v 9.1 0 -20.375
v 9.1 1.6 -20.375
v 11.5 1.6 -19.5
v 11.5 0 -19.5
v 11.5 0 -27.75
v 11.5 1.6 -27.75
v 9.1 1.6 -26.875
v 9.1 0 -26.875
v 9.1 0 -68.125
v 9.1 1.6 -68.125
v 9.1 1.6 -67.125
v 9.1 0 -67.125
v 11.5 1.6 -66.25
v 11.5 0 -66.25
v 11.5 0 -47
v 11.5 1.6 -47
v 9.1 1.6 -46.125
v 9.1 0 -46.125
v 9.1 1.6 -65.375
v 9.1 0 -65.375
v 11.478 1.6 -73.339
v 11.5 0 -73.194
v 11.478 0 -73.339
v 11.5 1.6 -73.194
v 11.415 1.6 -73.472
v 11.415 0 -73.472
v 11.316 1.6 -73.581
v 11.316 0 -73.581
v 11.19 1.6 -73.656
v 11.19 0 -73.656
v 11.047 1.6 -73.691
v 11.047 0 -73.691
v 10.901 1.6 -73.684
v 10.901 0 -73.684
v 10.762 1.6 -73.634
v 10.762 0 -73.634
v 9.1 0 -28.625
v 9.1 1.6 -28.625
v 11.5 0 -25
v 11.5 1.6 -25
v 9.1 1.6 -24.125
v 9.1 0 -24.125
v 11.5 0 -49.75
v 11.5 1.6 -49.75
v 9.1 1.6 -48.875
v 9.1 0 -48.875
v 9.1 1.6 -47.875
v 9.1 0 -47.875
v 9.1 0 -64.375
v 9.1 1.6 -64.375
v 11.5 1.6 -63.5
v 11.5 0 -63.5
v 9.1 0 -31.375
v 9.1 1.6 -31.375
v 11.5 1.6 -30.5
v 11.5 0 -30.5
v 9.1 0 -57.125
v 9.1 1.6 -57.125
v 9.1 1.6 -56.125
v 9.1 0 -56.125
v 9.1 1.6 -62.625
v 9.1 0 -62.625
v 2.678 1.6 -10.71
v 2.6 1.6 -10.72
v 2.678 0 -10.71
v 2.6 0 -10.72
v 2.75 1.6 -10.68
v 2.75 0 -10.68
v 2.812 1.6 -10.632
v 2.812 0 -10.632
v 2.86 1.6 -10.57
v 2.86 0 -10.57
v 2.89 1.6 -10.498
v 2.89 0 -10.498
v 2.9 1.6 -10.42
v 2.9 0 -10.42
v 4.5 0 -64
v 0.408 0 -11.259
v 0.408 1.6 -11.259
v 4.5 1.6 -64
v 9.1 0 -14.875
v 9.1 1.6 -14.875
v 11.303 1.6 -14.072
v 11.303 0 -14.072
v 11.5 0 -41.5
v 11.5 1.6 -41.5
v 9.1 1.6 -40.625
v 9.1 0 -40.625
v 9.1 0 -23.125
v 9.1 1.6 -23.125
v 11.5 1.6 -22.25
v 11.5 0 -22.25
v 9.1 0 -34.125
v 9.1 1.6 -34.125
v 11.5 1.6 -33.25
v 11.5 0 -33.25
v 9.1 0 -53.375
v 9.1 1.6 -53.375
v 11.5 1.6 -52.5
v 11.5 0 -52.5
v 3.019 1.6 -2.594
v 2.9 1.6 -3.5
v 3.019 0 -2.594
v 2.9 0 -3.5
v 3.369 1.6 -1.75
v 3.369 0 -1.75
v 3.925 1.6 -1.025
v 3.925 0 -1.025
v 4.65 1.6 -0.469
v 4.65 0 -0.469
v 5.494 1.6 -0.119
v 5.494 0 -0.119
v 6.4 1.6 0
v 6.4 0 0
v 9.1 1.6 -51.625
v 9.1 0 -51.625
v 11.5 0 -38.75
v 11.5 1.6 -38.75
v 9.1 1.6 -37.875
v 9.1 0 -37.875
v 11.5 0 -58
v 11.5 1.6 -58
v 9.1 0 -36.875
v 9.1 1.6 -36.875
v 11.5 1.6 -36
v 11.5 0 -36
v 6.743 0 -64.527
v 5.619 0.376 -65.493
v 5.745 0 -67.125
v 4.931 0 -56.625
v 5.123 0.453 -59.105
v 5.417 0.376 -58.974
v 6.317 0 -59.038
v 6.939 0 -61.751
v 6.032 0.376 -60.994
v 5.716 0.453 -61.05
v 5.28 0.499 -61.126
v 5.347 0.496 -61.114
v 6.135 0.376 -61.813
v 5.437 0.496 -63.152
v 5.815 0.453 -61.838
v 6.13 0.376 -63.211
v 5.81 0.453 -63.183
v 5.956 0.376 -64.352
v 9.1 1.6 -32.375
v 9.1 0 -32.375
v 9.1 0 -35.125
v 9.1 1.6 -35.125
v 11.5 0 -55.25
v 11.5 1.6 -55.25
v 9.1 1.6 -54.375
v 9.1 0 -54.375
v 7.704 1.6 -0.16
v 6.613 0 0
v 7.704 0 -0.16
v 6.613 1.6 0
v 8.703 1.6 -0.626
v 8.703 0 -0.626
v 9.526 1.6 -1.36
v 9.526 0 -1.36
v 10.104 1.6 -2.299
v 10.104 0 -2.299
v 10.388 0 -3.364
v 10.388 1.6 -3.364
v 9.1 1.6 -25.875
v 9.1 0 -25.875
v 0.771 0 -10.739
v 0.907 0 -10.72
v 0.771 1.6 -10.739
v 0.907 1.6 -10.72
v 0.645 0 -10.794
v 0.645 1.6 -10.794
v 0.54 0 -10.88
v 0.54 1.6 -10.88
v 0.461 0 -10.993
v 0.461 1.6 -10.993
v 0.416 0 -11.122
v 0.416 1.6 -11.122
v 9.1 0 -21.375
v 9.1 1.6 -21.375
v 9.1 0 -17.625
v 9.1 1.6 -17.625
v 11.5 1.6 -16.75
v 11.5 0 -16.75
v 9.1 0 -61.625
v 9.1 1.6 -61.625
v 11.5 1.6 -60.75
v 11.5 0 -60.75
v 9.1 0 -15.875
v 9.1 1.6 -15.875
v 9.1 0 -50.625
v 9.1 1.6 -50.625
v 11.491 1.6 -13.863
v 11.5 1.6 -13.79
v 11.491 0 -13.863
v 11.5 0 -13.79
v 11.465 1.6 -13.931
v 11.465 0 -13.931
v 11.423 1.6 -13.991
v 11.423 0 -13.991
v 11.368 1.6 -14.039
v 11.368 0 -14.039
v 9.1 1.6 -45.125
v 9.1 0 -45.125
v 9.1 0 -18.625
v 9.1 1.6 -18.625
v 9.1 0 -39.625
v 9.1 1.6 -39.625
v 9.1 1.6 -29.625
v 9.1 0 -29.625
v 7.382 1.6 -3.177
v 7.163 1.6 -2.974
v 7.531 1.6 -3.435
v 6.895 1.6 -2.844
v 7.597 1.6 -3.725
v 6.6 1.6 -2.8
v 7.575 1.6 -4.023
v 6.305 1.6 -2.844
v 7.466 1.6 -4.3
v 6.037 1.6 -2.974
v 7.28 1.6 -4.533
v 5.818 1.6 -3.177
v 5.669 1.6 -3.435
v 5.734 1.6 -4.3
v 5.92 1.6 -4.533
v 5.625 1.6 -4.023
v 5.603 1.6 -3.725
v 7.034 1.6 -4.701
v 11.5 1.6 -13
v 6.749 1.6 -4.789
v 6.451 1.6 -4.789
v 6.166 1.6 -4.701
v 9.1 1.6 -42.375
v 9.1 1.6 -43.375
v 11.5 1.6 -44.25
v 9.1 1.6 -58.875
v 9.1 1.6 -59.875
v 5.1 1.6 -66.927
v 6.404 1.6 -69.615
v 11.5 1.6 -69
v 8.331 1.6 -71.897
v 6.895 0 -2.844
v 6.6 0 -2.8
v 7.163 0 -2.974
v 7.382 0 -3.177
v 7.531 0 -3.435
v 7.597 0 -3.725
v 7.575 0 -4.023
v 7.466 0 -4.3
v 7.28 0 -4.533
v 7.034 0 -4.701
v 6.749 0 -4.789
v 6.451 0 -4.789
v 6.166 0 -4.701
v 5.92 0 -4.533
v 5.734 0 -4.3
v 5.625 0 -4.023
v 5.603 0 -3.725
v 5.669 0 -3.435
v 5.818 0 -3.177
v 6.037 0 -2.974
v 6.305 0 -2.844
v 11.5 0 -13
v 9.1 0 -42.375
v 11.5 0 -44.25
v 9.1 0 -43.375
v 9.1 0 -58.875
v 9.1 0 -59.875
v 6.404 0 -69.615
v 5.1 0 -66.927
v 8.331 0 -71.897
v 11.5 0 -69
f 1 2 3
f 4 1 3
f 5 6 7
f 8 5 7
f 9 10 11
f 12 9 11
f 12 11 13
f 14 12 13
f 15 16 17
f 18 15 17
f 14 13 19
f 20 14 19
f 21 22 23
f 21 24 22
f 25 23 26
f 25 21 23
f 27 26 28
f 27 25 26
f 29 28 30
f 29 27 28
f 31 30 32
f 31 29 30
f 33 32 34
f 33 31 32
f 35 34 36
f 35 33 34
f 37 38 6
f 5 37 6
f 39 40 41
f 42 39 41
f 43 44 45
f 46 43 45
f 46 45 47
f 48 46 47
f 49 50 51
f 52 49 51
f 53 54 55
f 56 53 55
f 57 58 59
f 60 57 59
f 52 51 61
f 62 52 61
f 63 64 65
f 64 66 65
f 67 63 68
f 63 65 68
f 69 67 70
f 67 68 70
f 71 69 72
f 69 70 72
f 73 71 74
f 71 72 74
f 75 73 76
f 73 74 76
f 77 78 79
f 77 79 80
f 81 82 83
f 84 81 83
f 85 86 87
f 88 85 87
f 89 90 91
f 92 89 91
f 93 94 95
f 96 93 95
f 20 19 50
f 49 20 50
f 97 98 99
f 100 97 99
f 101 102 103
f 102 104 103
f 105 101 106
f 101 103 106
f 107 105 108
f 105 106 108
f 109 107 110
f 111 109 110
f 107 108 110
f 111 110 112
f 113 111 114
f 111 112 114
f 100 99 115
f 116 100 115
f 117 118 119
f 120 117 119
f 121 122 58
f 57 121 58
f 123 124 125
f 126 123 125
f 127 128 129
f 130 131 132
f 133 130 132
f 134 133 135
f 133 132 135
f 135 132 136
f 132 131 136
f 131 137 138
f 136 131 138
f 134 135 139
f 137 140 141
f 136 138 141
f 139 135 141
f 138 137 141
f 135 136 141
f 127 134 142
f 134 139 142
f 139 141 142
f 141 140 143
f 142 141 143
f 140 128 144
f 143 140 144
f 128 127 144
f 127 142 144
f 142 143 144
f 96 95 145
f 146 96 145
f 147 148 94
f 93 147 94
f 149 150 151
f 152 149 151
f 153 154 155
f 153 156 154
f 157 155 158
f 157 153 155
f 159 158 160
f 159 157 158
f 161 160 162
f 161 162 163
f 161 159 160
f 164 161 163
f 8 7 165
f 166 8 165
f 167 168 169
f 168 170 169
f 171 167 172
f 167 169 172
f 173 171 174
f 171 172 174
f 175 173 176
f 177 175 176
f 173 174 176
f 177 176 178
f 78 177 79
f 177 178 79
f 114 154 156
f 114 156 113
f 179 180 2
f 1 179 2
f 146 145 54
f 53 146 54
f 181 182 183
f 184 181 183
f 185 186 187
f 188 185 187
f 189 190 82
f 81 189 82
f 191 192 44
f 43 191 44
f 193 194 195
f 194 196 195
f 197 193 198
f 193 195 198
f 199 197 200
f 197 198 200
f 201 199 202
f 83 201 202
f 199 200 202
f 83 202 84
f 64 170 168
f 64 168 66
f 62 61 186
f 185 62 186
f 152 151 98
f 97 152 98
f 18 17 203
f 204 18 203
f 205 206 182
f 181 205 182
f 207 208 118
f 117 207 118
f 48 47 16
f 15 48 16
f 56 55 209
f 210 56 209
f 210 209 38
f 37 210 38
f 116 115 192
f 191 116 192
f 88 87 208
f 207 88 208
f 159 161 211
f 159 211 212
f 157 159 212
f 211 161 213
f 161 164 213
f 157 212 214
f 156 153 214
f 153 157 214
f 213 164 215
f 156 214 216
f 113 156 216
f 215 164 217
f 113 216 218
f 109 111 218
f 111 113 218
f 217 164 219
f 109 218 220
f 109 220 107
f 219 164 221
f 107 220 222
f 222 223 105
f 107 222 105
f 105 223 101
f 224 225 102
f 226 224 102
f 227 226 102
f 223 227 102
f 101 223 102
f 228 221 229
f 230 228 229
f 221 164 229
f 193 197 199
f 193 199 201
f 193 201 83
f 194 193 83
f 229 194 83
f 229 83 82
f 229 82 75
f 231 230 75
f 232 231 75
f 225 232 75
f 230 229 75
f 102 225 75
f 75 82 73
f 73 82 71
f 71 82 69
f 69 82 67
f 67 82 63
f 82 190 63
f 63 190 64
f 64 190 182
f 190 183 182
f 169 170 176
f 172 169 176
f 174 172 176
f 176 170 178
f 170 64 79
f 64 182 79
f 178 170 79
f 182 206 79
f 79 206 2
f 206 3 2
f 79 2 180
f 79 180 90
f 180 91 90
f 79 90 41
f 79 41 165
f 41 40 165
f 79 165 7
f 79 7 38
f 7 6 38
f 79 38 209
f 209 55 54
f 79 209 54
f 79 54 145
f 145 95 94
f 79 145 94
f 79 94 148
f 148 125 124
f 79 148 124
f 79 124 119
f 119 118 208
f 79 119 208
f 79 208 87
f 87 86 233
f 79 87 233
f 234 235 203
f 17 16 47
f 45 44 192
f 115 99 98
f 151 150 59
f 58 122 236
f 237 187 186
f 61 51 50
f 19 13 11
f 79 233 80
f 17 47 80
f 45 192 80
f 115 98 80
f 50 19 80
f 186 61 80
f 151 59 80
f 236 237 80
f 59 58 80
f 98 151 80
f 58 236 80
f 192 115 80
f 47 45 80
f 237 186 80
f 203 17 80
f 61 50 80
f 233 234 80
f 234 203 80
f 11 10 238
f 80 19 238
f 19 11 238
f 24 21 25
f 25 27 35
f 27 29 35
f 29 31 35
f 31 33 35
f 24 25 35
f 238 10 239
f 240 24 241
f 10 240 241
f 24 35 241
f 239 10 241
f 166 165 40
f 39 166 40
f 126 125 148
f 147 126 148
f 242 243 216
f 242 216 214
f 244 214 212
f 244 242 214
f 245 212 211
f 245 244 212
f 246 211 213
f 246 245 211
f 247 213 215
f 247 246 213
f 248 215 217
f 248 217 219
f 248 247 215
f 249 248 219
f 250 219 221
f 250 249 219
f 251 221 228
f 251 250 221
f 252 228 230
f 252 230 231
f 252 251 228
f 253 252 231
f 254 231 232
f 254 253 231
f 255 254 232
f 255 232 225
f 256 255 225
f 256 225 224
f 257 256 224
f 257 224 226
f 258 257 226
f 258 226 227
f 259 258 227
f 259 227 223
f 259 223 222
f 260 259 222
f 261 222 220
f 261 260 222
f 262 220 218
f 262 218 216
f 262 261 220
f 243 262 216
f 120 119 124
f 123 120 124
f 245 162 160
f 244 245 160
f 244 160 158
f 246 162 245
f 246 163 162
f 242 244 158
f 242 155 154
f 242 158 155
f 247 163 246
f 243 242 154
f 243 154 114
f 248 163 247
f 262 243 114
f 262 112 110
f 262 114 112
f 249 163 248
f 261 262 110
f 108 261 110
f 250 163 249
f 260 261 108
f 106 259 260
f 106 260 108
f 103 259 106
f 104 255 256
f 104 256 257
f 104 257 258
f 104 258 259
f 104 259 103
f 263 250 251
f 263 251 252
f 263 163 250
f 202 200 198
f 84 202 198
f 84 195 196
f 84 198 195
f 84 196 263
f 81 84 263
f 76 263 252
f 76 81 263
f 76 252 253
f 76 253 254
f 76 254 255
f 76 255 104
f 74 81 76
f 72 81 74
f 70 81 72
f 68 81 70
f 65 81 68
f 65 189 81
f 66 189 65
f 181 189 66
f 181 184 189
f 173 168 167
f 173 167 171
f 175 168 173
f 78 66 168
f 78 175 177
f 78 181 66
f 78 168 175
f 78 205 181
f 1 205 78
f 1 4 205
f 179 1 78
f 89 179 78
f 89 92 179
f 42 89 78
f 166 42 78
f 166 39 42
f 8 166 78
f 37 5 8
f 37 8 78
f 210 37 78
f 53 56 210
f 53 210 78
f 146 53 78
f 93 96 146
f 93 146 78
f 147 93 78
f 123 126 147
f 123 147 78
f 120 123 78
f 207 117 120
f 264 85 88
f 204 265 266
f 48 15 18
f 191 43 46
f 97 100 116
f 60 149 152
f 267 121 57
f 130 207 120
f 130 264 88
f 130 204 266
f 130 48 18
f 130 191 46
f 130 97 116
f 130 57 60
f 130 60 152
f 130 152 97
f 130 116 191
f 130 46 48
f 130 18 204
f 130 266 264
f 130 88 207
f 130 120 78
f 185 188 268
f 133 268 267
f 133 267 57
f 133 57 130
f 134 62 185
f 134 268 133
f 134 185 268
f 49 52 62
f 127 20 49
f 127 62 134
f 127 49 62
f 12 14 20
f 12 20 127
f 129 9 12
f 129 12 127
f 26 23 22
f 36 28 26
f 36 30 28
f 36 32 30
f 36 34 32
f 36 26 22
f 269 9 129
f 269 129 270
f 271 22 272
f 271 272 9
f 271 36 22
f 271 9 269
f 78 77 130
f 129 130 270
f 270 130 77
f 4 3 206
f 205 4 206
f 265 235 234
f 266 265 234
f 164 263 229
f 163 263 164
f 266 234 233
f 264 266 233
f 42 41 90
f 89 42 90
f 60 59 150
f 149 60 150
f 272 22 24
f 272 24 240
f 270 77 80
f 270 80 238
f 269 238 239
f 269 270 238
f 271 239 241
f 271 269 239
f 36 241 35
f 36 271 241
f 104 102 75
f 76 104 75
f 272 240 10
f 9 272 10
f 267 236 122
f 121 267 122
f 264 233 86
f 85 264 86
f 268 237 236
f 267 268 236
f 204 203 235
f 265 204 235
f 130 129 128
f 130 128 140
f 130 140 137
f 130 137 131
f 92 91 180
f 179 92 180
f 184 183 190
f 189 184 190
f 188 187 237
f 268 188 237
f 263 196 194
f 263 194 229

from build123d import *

# Parameters (mm, degrees)
SKETCH2_R           = 1
BOSS_EXTRUDE1_DEPTH = 1.6
FILLET1_R           = 3.8
SKETCH3_W           = 2.9
SKETCH3_H           = 10.72
CUT_EXTRUDE1_DEPTH  = 75.905340264
CUT_EXTRUDE2_DEPTH  = 75.905340264
FILLET2_R           = 0.5
LPATTERN1_COUNT     = 20
LPATTERN1_PITCH     = 2.75
CUT_EXTRUDE5_DEPTH  = 0.5
FILLET3_R           = 3
FILLET4_R           = 3.5
FILLET5_R           = 0.5
FILLET6_R           = 0.3


with BuildPart() as part:
    # Sketch2 → Boss-Extrude1 (new body)
    with BuildSketch(Plane(origin=(0, 0, 0), x_dir=(1, 0, 0), z_dir=(0, 1, 0))):
        with BuildLine():
            Line((0, 0), (0, 6))
            Line((0, 6), (4.5, 64))
            ThreePointArc((4.5, 64), (6.634239414, 69.95603241), (11.5, 74))
            Line((11.5, 74), (11.5, 13))
            Line((11.5, 13), (10, 0))
            Line((10, 0), (0, 0))
        make_face()
        with Locations(Location((6.6, 3.8, 0), (0, 0, 270))):
            Circle(SKETCH2_R, mode=Mode.SUBTRACT)
    extrude(amount=BOSS_EXTRUDE1_DEPTH)

    # Fillet1
    fillet1_edges = [part.edges().sort_by_distance(p)[0] for p in [
        (10, 0.8, 0),
    ]]
    fillet(fillet1_edges, radius=FILLET1_R)

    # Sketch3 → Cut-Extrude1 (cut, through all)
    with BuildSketch(Plane(origin=(0, 1.6, 0), x_dir=(1, 0, 0), z_dir=(0, 1, 0))):
        with Locations((1.45, 5.36)):
            Rectangle(SKETCH3_W, SKETCH3_H)
    extrude(amount=-CUT_EXTRUDE1_DEPTH, mode=Mode.SUBTRACT)

    # Sketch4 → Cut-Extrude2 (cut, through all)
    with BuildSketch(Plane(origin=(0, 1.6, 0), x_dir=(1, 0, 0), z_dir=(0, 1, 0))):
        Polygon((11.5, 69), (9.1, 68.125), (9.1, 67.125), (11.5, 66.25), align=None)
    cut_extrude2 = extrude(amount=-CUT_EXTRUDE2_DEPTH, mode=Mode.SUBTRACT)

    # Fillet2
    fillet2_edges = [part.edges().sort_by_distance(p)[0] for p in [
        (11.5, 0.8, -74),
    ]]
    fillet(fillet2_edges, radius=FILLET2_R)

    # LPattern1: Cut-Extrude2 ×20
    with Locations(*[(0, 0, i * LPATTERN1_PITCH) for i in range(1, LPATTERN1_COUNT)]):
        add(cut_extrude2, mode=Mode.SUBTRACT)

    # Sketch6 → Cut-Extrude5 (cut)
    with BuildSketch(Plane.XZ):
        with BuildLine():
            Line((5.74546219, -67.125), (4.930807018, -56.625))
            ThreePointArc((4.930807018, -56.625), (6.938890592, -61.750803415), (5.74546219, -67.125))
        make_face()
    extrude(amount=-CUT_EXTRUDE5_DEPTH, mode=Mode.SUBTRACT)

    # Fillet3
    # the kernel refuses this fillet: 3 mm, written as the material it adds along each edge
    with BuildSketch(Plane(origin=(-2.470700866, 0.5, -62.480857924), x_dir=(0.44582092023827286, 0, 0.8951221743862118), z_dir=(-0.8951221743862118, 0, 0.44582092023827286))) as fillet3_piece_1_section:
        with BuildLine():
            CenterArc((7.77955765, -3), FILLET3_R, 56.442690238, 33.557309762)
            Line((7.77955765, 0), (7.77955765, 0.06))
            Line((7.77955765, 0.06), (9.437870045, 0.06))
            Line((9.437870045, 0.06), (9.497870045, 0))
            ThreePointArc((9.497870045, 0), (9.497870045, -0.25), (9.471036293, -0.45))
            Line((9.471036293, -0.45), (9.437870045, -0.5))
        make_face()
    fillet3_piece_1 = revolve(axis=Axis((-2.470700866, 0.5, -62.480857924), (0, 1, 0)), revolution_arc=118.175305081, mode=Mode.PRIVATE)
    fillet3_piece_1 = split(fillet3_piece_1, bisect_by=Plane(origin=(5.338134618, 0.375117564, -61.875000174), z_dir=(0.997003710874575, 0, 0.07735373618854458)), keep=Keep.TOP, mode=Mode.PRIVATE)
    add(fillet3_piece_1)

    # Fillet4
    fillet4_edges = [part.edges().sort_by_distance(p)[0] for p in [
        (2.9, 0.8, 0),
    ]]
    fillet(fillet4_edges, radius=FILLET4_R)

    # Fillet5
    fillet5_edges = [part.edges().sort_by_distance(p)[0] for p in [
        (0.366206897, 0.8, -10.72),
    ]]
    fillet(fillet5_edges, radius=FILLET5_R)

    # Fillet6
    fillet6_edges = [part.edges().sort_by_distance(p)[0] for p in [
        (11.5, 0.8, -14),
        (2.9, 0.8, -10.72),
    ]]
    fillet(fillet6_edges, radius=FILLET6_R)


solid = part.part
